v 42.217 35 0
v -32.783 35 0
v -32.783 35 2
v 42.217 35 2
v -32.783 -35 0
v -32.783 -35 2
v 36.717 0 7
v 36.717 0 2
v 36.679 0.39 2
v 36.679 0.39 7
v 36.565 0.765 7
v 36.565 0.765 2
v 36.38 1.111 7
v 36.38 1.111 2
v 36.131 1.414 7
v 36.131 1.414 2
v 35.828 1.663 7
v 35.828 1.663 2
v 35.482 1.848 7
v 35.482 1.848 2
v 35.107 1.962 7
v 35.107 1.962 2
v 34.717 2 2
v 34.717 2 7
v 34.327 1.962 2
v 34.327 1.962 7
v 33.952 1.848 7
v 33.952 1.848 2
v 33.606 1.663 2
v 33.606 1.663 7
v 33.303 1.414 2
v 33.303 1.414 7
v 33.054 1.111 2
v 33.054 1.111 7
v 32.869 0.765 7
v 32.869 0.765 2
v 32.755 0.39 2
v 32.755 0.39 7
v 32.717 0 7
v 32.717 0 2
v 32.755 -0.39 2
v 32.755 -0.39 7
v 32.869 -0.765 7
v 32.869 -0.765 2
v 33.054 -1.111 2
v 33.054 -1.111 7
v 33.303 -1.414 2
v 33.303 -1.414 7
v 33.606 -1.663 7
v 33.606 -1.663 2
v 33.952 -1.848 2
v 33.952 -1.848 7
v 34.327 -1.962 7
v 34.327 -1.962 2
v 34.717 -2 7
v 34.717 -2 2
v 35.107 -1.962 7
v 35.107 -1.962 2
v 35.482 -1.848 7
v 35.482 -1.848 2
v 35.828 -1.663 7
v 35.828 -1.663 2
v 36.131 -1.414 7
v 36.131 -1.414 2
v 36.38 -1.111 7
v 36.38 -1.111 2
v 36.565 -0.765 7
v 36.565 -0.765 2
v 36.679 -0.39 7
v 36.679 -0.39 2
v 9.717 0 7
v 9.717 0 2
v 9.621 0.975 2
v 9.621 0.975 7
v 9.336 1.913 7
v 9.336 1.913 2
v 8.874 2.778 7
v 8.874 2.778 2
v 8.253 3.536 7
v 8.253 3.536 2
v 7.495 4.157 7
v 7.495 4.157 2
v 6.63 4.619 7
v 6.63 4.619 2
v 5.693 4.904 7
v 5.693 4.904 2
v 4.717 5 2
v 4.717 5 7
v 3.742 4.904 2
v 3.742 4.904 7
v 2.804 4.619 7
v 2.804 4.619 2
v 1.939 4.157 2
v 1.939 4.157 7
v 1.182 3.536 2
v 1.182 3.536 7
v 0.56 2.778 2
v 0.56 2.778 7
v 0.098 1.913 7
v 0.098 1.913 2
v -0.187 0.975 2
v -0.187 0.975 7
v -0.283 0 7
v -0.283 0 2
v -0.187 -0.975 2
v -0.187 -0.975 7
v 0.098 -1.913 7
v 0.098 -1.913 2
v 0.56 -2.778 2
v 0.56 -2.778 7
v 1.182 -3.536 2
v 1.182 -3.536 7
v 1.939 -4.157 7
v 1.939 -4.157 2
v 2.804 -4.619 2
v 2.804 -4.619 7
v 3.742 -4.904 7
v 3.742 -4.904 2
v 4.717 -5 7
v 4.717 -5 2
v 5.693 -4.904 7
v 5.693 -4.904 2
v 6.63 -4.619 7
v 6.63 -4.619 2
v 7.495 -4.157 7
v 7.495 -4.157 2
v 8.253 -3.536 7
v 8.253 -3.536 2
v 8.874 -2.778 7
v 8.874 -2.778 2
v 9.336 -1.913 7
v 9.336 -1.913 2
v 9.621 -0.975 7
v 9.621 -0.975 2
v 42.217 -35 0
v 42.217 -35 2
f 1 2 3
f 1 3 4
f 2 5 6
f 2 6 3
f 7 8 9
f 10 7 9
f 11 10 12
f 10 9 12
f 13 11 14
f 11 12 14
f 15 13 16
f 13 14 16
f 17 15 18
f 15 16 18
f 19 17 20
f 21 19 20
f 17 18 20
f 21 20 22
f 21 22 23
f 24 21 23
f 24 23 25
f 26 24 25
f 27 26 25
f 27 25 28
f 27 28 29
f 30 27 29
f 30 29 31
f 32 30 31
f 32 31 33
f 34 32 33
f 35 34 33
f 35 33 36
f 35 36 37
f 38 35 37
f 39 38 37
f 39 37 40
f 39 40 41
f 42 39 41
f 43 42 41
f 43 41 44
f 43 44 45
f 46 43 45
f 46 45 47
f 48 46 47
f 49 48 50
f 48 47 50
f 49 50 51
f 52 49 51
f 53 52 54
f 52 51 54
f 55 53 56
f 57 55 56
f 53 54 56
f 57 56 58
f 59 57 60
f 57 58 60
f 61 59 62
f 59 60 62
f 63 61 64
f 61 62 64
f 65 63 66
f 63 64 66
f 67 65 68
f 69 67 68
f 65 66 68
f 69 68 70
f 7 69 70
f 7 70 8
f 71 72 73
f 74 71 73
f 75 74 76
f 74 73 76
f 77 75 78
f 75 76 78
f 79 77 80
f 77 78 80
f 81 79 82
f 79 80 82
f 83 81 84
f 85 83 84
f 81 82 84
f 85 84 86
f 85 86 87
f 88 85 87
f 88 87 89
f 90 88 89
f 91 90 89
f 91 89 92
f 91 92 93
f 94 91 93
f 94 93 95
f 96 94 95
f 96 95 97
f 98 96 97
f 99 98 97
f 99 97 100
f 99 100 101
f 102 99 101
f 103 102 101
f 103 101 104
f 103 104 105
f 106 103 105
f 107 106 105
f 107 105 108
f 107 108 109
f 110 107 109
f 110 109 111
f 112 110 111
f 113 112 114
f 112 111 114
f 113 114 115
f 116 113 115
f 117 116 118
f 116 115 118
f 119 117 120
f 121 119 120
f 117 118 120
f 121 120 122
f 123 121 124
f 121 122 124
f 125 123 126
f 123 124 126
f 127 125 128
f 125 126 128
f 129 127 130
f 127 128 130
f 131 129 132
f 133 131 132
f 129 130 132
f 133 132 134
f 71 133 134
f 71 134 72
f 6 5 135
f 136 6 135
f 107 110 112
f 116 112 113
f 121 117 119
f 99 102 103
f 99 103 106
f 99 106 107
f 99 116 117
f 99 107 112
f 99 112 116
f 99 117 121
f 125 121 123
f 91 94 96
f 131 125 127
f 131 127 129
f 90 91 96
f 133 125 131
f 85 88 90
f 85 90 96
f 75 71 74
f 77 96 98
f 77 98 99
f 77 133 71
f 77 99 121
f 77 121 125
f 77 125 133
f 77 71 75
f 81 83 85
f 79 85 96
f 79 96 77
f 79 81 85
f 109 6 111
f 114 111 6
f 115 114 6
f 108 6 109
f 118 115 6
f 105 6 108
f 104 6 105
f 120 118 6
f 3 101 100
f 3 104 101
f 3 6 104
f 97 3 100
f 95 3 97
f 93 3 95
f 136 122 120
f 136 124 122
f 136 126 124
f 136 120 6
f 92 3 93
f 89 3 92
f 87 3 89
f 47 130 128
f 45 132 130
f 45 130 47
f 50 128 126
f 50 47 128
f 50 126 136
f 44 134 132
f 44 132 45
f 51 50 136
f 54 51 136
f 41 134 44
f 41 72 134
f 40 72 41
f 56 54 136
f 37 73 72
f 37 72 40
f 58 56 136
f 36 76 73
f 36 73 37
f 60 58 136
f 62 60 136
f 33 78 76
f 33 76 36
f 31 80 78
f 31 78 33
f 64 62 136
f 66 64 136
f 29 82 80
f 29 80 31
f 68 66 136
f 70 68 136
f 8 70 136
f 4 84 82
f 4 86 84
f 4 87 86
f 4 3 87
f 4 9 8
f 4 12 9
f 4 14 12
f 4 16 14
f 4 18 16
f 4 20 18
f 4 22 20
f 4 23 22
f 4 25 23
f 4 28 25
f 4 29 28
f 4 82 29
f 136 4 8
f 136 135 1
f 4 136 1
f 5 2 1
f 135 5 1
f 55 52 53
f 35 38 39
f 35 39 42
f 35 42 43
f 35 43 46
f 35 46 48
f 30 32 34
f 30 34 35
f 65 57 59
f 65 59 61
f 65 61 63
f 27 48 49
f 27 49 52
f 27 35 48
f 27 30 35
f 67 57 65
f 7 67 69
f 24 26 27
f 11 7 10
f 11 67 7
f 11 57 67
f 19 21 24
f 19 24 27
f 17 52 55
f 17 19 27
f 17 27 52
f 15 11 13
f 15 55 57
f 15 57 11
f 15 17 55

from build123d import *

# Parameters (mm, degrees)
F0_W     = 75
F0_H     = 70
F0_R     = 5
F0_R_2   = 2
F1_DEPTH = 2
F2_DEPTH = 7


with BuildPart() as f1:
    # F0 (on Top) → F1 (new body)
    with BuildSketch(Plane.XY):
        with Locations((4.717057, 0)):
            Rectangle(F0_W, F0_H)
        with Locations((4.717057, 0)):
            Circle(F0_R, mode=Mode.SUBTRACT)
        with Locations((34.717057, 0)):
            Circle(F0_R_2, mode=Mode.SUBTRACT)
    extrude(amount=F1_DEPTH)

    # F0 (on Top) → F2 (join)
    with BuildSketch(Plane.XY):
        with Locations((4.717057, 0)):
            Circle(F0_R)
        with Locations((34.717057, 0)):
            Circle(F0_R_2)
    extrude(amount=F2_DEPTH)


solid = f1.part
